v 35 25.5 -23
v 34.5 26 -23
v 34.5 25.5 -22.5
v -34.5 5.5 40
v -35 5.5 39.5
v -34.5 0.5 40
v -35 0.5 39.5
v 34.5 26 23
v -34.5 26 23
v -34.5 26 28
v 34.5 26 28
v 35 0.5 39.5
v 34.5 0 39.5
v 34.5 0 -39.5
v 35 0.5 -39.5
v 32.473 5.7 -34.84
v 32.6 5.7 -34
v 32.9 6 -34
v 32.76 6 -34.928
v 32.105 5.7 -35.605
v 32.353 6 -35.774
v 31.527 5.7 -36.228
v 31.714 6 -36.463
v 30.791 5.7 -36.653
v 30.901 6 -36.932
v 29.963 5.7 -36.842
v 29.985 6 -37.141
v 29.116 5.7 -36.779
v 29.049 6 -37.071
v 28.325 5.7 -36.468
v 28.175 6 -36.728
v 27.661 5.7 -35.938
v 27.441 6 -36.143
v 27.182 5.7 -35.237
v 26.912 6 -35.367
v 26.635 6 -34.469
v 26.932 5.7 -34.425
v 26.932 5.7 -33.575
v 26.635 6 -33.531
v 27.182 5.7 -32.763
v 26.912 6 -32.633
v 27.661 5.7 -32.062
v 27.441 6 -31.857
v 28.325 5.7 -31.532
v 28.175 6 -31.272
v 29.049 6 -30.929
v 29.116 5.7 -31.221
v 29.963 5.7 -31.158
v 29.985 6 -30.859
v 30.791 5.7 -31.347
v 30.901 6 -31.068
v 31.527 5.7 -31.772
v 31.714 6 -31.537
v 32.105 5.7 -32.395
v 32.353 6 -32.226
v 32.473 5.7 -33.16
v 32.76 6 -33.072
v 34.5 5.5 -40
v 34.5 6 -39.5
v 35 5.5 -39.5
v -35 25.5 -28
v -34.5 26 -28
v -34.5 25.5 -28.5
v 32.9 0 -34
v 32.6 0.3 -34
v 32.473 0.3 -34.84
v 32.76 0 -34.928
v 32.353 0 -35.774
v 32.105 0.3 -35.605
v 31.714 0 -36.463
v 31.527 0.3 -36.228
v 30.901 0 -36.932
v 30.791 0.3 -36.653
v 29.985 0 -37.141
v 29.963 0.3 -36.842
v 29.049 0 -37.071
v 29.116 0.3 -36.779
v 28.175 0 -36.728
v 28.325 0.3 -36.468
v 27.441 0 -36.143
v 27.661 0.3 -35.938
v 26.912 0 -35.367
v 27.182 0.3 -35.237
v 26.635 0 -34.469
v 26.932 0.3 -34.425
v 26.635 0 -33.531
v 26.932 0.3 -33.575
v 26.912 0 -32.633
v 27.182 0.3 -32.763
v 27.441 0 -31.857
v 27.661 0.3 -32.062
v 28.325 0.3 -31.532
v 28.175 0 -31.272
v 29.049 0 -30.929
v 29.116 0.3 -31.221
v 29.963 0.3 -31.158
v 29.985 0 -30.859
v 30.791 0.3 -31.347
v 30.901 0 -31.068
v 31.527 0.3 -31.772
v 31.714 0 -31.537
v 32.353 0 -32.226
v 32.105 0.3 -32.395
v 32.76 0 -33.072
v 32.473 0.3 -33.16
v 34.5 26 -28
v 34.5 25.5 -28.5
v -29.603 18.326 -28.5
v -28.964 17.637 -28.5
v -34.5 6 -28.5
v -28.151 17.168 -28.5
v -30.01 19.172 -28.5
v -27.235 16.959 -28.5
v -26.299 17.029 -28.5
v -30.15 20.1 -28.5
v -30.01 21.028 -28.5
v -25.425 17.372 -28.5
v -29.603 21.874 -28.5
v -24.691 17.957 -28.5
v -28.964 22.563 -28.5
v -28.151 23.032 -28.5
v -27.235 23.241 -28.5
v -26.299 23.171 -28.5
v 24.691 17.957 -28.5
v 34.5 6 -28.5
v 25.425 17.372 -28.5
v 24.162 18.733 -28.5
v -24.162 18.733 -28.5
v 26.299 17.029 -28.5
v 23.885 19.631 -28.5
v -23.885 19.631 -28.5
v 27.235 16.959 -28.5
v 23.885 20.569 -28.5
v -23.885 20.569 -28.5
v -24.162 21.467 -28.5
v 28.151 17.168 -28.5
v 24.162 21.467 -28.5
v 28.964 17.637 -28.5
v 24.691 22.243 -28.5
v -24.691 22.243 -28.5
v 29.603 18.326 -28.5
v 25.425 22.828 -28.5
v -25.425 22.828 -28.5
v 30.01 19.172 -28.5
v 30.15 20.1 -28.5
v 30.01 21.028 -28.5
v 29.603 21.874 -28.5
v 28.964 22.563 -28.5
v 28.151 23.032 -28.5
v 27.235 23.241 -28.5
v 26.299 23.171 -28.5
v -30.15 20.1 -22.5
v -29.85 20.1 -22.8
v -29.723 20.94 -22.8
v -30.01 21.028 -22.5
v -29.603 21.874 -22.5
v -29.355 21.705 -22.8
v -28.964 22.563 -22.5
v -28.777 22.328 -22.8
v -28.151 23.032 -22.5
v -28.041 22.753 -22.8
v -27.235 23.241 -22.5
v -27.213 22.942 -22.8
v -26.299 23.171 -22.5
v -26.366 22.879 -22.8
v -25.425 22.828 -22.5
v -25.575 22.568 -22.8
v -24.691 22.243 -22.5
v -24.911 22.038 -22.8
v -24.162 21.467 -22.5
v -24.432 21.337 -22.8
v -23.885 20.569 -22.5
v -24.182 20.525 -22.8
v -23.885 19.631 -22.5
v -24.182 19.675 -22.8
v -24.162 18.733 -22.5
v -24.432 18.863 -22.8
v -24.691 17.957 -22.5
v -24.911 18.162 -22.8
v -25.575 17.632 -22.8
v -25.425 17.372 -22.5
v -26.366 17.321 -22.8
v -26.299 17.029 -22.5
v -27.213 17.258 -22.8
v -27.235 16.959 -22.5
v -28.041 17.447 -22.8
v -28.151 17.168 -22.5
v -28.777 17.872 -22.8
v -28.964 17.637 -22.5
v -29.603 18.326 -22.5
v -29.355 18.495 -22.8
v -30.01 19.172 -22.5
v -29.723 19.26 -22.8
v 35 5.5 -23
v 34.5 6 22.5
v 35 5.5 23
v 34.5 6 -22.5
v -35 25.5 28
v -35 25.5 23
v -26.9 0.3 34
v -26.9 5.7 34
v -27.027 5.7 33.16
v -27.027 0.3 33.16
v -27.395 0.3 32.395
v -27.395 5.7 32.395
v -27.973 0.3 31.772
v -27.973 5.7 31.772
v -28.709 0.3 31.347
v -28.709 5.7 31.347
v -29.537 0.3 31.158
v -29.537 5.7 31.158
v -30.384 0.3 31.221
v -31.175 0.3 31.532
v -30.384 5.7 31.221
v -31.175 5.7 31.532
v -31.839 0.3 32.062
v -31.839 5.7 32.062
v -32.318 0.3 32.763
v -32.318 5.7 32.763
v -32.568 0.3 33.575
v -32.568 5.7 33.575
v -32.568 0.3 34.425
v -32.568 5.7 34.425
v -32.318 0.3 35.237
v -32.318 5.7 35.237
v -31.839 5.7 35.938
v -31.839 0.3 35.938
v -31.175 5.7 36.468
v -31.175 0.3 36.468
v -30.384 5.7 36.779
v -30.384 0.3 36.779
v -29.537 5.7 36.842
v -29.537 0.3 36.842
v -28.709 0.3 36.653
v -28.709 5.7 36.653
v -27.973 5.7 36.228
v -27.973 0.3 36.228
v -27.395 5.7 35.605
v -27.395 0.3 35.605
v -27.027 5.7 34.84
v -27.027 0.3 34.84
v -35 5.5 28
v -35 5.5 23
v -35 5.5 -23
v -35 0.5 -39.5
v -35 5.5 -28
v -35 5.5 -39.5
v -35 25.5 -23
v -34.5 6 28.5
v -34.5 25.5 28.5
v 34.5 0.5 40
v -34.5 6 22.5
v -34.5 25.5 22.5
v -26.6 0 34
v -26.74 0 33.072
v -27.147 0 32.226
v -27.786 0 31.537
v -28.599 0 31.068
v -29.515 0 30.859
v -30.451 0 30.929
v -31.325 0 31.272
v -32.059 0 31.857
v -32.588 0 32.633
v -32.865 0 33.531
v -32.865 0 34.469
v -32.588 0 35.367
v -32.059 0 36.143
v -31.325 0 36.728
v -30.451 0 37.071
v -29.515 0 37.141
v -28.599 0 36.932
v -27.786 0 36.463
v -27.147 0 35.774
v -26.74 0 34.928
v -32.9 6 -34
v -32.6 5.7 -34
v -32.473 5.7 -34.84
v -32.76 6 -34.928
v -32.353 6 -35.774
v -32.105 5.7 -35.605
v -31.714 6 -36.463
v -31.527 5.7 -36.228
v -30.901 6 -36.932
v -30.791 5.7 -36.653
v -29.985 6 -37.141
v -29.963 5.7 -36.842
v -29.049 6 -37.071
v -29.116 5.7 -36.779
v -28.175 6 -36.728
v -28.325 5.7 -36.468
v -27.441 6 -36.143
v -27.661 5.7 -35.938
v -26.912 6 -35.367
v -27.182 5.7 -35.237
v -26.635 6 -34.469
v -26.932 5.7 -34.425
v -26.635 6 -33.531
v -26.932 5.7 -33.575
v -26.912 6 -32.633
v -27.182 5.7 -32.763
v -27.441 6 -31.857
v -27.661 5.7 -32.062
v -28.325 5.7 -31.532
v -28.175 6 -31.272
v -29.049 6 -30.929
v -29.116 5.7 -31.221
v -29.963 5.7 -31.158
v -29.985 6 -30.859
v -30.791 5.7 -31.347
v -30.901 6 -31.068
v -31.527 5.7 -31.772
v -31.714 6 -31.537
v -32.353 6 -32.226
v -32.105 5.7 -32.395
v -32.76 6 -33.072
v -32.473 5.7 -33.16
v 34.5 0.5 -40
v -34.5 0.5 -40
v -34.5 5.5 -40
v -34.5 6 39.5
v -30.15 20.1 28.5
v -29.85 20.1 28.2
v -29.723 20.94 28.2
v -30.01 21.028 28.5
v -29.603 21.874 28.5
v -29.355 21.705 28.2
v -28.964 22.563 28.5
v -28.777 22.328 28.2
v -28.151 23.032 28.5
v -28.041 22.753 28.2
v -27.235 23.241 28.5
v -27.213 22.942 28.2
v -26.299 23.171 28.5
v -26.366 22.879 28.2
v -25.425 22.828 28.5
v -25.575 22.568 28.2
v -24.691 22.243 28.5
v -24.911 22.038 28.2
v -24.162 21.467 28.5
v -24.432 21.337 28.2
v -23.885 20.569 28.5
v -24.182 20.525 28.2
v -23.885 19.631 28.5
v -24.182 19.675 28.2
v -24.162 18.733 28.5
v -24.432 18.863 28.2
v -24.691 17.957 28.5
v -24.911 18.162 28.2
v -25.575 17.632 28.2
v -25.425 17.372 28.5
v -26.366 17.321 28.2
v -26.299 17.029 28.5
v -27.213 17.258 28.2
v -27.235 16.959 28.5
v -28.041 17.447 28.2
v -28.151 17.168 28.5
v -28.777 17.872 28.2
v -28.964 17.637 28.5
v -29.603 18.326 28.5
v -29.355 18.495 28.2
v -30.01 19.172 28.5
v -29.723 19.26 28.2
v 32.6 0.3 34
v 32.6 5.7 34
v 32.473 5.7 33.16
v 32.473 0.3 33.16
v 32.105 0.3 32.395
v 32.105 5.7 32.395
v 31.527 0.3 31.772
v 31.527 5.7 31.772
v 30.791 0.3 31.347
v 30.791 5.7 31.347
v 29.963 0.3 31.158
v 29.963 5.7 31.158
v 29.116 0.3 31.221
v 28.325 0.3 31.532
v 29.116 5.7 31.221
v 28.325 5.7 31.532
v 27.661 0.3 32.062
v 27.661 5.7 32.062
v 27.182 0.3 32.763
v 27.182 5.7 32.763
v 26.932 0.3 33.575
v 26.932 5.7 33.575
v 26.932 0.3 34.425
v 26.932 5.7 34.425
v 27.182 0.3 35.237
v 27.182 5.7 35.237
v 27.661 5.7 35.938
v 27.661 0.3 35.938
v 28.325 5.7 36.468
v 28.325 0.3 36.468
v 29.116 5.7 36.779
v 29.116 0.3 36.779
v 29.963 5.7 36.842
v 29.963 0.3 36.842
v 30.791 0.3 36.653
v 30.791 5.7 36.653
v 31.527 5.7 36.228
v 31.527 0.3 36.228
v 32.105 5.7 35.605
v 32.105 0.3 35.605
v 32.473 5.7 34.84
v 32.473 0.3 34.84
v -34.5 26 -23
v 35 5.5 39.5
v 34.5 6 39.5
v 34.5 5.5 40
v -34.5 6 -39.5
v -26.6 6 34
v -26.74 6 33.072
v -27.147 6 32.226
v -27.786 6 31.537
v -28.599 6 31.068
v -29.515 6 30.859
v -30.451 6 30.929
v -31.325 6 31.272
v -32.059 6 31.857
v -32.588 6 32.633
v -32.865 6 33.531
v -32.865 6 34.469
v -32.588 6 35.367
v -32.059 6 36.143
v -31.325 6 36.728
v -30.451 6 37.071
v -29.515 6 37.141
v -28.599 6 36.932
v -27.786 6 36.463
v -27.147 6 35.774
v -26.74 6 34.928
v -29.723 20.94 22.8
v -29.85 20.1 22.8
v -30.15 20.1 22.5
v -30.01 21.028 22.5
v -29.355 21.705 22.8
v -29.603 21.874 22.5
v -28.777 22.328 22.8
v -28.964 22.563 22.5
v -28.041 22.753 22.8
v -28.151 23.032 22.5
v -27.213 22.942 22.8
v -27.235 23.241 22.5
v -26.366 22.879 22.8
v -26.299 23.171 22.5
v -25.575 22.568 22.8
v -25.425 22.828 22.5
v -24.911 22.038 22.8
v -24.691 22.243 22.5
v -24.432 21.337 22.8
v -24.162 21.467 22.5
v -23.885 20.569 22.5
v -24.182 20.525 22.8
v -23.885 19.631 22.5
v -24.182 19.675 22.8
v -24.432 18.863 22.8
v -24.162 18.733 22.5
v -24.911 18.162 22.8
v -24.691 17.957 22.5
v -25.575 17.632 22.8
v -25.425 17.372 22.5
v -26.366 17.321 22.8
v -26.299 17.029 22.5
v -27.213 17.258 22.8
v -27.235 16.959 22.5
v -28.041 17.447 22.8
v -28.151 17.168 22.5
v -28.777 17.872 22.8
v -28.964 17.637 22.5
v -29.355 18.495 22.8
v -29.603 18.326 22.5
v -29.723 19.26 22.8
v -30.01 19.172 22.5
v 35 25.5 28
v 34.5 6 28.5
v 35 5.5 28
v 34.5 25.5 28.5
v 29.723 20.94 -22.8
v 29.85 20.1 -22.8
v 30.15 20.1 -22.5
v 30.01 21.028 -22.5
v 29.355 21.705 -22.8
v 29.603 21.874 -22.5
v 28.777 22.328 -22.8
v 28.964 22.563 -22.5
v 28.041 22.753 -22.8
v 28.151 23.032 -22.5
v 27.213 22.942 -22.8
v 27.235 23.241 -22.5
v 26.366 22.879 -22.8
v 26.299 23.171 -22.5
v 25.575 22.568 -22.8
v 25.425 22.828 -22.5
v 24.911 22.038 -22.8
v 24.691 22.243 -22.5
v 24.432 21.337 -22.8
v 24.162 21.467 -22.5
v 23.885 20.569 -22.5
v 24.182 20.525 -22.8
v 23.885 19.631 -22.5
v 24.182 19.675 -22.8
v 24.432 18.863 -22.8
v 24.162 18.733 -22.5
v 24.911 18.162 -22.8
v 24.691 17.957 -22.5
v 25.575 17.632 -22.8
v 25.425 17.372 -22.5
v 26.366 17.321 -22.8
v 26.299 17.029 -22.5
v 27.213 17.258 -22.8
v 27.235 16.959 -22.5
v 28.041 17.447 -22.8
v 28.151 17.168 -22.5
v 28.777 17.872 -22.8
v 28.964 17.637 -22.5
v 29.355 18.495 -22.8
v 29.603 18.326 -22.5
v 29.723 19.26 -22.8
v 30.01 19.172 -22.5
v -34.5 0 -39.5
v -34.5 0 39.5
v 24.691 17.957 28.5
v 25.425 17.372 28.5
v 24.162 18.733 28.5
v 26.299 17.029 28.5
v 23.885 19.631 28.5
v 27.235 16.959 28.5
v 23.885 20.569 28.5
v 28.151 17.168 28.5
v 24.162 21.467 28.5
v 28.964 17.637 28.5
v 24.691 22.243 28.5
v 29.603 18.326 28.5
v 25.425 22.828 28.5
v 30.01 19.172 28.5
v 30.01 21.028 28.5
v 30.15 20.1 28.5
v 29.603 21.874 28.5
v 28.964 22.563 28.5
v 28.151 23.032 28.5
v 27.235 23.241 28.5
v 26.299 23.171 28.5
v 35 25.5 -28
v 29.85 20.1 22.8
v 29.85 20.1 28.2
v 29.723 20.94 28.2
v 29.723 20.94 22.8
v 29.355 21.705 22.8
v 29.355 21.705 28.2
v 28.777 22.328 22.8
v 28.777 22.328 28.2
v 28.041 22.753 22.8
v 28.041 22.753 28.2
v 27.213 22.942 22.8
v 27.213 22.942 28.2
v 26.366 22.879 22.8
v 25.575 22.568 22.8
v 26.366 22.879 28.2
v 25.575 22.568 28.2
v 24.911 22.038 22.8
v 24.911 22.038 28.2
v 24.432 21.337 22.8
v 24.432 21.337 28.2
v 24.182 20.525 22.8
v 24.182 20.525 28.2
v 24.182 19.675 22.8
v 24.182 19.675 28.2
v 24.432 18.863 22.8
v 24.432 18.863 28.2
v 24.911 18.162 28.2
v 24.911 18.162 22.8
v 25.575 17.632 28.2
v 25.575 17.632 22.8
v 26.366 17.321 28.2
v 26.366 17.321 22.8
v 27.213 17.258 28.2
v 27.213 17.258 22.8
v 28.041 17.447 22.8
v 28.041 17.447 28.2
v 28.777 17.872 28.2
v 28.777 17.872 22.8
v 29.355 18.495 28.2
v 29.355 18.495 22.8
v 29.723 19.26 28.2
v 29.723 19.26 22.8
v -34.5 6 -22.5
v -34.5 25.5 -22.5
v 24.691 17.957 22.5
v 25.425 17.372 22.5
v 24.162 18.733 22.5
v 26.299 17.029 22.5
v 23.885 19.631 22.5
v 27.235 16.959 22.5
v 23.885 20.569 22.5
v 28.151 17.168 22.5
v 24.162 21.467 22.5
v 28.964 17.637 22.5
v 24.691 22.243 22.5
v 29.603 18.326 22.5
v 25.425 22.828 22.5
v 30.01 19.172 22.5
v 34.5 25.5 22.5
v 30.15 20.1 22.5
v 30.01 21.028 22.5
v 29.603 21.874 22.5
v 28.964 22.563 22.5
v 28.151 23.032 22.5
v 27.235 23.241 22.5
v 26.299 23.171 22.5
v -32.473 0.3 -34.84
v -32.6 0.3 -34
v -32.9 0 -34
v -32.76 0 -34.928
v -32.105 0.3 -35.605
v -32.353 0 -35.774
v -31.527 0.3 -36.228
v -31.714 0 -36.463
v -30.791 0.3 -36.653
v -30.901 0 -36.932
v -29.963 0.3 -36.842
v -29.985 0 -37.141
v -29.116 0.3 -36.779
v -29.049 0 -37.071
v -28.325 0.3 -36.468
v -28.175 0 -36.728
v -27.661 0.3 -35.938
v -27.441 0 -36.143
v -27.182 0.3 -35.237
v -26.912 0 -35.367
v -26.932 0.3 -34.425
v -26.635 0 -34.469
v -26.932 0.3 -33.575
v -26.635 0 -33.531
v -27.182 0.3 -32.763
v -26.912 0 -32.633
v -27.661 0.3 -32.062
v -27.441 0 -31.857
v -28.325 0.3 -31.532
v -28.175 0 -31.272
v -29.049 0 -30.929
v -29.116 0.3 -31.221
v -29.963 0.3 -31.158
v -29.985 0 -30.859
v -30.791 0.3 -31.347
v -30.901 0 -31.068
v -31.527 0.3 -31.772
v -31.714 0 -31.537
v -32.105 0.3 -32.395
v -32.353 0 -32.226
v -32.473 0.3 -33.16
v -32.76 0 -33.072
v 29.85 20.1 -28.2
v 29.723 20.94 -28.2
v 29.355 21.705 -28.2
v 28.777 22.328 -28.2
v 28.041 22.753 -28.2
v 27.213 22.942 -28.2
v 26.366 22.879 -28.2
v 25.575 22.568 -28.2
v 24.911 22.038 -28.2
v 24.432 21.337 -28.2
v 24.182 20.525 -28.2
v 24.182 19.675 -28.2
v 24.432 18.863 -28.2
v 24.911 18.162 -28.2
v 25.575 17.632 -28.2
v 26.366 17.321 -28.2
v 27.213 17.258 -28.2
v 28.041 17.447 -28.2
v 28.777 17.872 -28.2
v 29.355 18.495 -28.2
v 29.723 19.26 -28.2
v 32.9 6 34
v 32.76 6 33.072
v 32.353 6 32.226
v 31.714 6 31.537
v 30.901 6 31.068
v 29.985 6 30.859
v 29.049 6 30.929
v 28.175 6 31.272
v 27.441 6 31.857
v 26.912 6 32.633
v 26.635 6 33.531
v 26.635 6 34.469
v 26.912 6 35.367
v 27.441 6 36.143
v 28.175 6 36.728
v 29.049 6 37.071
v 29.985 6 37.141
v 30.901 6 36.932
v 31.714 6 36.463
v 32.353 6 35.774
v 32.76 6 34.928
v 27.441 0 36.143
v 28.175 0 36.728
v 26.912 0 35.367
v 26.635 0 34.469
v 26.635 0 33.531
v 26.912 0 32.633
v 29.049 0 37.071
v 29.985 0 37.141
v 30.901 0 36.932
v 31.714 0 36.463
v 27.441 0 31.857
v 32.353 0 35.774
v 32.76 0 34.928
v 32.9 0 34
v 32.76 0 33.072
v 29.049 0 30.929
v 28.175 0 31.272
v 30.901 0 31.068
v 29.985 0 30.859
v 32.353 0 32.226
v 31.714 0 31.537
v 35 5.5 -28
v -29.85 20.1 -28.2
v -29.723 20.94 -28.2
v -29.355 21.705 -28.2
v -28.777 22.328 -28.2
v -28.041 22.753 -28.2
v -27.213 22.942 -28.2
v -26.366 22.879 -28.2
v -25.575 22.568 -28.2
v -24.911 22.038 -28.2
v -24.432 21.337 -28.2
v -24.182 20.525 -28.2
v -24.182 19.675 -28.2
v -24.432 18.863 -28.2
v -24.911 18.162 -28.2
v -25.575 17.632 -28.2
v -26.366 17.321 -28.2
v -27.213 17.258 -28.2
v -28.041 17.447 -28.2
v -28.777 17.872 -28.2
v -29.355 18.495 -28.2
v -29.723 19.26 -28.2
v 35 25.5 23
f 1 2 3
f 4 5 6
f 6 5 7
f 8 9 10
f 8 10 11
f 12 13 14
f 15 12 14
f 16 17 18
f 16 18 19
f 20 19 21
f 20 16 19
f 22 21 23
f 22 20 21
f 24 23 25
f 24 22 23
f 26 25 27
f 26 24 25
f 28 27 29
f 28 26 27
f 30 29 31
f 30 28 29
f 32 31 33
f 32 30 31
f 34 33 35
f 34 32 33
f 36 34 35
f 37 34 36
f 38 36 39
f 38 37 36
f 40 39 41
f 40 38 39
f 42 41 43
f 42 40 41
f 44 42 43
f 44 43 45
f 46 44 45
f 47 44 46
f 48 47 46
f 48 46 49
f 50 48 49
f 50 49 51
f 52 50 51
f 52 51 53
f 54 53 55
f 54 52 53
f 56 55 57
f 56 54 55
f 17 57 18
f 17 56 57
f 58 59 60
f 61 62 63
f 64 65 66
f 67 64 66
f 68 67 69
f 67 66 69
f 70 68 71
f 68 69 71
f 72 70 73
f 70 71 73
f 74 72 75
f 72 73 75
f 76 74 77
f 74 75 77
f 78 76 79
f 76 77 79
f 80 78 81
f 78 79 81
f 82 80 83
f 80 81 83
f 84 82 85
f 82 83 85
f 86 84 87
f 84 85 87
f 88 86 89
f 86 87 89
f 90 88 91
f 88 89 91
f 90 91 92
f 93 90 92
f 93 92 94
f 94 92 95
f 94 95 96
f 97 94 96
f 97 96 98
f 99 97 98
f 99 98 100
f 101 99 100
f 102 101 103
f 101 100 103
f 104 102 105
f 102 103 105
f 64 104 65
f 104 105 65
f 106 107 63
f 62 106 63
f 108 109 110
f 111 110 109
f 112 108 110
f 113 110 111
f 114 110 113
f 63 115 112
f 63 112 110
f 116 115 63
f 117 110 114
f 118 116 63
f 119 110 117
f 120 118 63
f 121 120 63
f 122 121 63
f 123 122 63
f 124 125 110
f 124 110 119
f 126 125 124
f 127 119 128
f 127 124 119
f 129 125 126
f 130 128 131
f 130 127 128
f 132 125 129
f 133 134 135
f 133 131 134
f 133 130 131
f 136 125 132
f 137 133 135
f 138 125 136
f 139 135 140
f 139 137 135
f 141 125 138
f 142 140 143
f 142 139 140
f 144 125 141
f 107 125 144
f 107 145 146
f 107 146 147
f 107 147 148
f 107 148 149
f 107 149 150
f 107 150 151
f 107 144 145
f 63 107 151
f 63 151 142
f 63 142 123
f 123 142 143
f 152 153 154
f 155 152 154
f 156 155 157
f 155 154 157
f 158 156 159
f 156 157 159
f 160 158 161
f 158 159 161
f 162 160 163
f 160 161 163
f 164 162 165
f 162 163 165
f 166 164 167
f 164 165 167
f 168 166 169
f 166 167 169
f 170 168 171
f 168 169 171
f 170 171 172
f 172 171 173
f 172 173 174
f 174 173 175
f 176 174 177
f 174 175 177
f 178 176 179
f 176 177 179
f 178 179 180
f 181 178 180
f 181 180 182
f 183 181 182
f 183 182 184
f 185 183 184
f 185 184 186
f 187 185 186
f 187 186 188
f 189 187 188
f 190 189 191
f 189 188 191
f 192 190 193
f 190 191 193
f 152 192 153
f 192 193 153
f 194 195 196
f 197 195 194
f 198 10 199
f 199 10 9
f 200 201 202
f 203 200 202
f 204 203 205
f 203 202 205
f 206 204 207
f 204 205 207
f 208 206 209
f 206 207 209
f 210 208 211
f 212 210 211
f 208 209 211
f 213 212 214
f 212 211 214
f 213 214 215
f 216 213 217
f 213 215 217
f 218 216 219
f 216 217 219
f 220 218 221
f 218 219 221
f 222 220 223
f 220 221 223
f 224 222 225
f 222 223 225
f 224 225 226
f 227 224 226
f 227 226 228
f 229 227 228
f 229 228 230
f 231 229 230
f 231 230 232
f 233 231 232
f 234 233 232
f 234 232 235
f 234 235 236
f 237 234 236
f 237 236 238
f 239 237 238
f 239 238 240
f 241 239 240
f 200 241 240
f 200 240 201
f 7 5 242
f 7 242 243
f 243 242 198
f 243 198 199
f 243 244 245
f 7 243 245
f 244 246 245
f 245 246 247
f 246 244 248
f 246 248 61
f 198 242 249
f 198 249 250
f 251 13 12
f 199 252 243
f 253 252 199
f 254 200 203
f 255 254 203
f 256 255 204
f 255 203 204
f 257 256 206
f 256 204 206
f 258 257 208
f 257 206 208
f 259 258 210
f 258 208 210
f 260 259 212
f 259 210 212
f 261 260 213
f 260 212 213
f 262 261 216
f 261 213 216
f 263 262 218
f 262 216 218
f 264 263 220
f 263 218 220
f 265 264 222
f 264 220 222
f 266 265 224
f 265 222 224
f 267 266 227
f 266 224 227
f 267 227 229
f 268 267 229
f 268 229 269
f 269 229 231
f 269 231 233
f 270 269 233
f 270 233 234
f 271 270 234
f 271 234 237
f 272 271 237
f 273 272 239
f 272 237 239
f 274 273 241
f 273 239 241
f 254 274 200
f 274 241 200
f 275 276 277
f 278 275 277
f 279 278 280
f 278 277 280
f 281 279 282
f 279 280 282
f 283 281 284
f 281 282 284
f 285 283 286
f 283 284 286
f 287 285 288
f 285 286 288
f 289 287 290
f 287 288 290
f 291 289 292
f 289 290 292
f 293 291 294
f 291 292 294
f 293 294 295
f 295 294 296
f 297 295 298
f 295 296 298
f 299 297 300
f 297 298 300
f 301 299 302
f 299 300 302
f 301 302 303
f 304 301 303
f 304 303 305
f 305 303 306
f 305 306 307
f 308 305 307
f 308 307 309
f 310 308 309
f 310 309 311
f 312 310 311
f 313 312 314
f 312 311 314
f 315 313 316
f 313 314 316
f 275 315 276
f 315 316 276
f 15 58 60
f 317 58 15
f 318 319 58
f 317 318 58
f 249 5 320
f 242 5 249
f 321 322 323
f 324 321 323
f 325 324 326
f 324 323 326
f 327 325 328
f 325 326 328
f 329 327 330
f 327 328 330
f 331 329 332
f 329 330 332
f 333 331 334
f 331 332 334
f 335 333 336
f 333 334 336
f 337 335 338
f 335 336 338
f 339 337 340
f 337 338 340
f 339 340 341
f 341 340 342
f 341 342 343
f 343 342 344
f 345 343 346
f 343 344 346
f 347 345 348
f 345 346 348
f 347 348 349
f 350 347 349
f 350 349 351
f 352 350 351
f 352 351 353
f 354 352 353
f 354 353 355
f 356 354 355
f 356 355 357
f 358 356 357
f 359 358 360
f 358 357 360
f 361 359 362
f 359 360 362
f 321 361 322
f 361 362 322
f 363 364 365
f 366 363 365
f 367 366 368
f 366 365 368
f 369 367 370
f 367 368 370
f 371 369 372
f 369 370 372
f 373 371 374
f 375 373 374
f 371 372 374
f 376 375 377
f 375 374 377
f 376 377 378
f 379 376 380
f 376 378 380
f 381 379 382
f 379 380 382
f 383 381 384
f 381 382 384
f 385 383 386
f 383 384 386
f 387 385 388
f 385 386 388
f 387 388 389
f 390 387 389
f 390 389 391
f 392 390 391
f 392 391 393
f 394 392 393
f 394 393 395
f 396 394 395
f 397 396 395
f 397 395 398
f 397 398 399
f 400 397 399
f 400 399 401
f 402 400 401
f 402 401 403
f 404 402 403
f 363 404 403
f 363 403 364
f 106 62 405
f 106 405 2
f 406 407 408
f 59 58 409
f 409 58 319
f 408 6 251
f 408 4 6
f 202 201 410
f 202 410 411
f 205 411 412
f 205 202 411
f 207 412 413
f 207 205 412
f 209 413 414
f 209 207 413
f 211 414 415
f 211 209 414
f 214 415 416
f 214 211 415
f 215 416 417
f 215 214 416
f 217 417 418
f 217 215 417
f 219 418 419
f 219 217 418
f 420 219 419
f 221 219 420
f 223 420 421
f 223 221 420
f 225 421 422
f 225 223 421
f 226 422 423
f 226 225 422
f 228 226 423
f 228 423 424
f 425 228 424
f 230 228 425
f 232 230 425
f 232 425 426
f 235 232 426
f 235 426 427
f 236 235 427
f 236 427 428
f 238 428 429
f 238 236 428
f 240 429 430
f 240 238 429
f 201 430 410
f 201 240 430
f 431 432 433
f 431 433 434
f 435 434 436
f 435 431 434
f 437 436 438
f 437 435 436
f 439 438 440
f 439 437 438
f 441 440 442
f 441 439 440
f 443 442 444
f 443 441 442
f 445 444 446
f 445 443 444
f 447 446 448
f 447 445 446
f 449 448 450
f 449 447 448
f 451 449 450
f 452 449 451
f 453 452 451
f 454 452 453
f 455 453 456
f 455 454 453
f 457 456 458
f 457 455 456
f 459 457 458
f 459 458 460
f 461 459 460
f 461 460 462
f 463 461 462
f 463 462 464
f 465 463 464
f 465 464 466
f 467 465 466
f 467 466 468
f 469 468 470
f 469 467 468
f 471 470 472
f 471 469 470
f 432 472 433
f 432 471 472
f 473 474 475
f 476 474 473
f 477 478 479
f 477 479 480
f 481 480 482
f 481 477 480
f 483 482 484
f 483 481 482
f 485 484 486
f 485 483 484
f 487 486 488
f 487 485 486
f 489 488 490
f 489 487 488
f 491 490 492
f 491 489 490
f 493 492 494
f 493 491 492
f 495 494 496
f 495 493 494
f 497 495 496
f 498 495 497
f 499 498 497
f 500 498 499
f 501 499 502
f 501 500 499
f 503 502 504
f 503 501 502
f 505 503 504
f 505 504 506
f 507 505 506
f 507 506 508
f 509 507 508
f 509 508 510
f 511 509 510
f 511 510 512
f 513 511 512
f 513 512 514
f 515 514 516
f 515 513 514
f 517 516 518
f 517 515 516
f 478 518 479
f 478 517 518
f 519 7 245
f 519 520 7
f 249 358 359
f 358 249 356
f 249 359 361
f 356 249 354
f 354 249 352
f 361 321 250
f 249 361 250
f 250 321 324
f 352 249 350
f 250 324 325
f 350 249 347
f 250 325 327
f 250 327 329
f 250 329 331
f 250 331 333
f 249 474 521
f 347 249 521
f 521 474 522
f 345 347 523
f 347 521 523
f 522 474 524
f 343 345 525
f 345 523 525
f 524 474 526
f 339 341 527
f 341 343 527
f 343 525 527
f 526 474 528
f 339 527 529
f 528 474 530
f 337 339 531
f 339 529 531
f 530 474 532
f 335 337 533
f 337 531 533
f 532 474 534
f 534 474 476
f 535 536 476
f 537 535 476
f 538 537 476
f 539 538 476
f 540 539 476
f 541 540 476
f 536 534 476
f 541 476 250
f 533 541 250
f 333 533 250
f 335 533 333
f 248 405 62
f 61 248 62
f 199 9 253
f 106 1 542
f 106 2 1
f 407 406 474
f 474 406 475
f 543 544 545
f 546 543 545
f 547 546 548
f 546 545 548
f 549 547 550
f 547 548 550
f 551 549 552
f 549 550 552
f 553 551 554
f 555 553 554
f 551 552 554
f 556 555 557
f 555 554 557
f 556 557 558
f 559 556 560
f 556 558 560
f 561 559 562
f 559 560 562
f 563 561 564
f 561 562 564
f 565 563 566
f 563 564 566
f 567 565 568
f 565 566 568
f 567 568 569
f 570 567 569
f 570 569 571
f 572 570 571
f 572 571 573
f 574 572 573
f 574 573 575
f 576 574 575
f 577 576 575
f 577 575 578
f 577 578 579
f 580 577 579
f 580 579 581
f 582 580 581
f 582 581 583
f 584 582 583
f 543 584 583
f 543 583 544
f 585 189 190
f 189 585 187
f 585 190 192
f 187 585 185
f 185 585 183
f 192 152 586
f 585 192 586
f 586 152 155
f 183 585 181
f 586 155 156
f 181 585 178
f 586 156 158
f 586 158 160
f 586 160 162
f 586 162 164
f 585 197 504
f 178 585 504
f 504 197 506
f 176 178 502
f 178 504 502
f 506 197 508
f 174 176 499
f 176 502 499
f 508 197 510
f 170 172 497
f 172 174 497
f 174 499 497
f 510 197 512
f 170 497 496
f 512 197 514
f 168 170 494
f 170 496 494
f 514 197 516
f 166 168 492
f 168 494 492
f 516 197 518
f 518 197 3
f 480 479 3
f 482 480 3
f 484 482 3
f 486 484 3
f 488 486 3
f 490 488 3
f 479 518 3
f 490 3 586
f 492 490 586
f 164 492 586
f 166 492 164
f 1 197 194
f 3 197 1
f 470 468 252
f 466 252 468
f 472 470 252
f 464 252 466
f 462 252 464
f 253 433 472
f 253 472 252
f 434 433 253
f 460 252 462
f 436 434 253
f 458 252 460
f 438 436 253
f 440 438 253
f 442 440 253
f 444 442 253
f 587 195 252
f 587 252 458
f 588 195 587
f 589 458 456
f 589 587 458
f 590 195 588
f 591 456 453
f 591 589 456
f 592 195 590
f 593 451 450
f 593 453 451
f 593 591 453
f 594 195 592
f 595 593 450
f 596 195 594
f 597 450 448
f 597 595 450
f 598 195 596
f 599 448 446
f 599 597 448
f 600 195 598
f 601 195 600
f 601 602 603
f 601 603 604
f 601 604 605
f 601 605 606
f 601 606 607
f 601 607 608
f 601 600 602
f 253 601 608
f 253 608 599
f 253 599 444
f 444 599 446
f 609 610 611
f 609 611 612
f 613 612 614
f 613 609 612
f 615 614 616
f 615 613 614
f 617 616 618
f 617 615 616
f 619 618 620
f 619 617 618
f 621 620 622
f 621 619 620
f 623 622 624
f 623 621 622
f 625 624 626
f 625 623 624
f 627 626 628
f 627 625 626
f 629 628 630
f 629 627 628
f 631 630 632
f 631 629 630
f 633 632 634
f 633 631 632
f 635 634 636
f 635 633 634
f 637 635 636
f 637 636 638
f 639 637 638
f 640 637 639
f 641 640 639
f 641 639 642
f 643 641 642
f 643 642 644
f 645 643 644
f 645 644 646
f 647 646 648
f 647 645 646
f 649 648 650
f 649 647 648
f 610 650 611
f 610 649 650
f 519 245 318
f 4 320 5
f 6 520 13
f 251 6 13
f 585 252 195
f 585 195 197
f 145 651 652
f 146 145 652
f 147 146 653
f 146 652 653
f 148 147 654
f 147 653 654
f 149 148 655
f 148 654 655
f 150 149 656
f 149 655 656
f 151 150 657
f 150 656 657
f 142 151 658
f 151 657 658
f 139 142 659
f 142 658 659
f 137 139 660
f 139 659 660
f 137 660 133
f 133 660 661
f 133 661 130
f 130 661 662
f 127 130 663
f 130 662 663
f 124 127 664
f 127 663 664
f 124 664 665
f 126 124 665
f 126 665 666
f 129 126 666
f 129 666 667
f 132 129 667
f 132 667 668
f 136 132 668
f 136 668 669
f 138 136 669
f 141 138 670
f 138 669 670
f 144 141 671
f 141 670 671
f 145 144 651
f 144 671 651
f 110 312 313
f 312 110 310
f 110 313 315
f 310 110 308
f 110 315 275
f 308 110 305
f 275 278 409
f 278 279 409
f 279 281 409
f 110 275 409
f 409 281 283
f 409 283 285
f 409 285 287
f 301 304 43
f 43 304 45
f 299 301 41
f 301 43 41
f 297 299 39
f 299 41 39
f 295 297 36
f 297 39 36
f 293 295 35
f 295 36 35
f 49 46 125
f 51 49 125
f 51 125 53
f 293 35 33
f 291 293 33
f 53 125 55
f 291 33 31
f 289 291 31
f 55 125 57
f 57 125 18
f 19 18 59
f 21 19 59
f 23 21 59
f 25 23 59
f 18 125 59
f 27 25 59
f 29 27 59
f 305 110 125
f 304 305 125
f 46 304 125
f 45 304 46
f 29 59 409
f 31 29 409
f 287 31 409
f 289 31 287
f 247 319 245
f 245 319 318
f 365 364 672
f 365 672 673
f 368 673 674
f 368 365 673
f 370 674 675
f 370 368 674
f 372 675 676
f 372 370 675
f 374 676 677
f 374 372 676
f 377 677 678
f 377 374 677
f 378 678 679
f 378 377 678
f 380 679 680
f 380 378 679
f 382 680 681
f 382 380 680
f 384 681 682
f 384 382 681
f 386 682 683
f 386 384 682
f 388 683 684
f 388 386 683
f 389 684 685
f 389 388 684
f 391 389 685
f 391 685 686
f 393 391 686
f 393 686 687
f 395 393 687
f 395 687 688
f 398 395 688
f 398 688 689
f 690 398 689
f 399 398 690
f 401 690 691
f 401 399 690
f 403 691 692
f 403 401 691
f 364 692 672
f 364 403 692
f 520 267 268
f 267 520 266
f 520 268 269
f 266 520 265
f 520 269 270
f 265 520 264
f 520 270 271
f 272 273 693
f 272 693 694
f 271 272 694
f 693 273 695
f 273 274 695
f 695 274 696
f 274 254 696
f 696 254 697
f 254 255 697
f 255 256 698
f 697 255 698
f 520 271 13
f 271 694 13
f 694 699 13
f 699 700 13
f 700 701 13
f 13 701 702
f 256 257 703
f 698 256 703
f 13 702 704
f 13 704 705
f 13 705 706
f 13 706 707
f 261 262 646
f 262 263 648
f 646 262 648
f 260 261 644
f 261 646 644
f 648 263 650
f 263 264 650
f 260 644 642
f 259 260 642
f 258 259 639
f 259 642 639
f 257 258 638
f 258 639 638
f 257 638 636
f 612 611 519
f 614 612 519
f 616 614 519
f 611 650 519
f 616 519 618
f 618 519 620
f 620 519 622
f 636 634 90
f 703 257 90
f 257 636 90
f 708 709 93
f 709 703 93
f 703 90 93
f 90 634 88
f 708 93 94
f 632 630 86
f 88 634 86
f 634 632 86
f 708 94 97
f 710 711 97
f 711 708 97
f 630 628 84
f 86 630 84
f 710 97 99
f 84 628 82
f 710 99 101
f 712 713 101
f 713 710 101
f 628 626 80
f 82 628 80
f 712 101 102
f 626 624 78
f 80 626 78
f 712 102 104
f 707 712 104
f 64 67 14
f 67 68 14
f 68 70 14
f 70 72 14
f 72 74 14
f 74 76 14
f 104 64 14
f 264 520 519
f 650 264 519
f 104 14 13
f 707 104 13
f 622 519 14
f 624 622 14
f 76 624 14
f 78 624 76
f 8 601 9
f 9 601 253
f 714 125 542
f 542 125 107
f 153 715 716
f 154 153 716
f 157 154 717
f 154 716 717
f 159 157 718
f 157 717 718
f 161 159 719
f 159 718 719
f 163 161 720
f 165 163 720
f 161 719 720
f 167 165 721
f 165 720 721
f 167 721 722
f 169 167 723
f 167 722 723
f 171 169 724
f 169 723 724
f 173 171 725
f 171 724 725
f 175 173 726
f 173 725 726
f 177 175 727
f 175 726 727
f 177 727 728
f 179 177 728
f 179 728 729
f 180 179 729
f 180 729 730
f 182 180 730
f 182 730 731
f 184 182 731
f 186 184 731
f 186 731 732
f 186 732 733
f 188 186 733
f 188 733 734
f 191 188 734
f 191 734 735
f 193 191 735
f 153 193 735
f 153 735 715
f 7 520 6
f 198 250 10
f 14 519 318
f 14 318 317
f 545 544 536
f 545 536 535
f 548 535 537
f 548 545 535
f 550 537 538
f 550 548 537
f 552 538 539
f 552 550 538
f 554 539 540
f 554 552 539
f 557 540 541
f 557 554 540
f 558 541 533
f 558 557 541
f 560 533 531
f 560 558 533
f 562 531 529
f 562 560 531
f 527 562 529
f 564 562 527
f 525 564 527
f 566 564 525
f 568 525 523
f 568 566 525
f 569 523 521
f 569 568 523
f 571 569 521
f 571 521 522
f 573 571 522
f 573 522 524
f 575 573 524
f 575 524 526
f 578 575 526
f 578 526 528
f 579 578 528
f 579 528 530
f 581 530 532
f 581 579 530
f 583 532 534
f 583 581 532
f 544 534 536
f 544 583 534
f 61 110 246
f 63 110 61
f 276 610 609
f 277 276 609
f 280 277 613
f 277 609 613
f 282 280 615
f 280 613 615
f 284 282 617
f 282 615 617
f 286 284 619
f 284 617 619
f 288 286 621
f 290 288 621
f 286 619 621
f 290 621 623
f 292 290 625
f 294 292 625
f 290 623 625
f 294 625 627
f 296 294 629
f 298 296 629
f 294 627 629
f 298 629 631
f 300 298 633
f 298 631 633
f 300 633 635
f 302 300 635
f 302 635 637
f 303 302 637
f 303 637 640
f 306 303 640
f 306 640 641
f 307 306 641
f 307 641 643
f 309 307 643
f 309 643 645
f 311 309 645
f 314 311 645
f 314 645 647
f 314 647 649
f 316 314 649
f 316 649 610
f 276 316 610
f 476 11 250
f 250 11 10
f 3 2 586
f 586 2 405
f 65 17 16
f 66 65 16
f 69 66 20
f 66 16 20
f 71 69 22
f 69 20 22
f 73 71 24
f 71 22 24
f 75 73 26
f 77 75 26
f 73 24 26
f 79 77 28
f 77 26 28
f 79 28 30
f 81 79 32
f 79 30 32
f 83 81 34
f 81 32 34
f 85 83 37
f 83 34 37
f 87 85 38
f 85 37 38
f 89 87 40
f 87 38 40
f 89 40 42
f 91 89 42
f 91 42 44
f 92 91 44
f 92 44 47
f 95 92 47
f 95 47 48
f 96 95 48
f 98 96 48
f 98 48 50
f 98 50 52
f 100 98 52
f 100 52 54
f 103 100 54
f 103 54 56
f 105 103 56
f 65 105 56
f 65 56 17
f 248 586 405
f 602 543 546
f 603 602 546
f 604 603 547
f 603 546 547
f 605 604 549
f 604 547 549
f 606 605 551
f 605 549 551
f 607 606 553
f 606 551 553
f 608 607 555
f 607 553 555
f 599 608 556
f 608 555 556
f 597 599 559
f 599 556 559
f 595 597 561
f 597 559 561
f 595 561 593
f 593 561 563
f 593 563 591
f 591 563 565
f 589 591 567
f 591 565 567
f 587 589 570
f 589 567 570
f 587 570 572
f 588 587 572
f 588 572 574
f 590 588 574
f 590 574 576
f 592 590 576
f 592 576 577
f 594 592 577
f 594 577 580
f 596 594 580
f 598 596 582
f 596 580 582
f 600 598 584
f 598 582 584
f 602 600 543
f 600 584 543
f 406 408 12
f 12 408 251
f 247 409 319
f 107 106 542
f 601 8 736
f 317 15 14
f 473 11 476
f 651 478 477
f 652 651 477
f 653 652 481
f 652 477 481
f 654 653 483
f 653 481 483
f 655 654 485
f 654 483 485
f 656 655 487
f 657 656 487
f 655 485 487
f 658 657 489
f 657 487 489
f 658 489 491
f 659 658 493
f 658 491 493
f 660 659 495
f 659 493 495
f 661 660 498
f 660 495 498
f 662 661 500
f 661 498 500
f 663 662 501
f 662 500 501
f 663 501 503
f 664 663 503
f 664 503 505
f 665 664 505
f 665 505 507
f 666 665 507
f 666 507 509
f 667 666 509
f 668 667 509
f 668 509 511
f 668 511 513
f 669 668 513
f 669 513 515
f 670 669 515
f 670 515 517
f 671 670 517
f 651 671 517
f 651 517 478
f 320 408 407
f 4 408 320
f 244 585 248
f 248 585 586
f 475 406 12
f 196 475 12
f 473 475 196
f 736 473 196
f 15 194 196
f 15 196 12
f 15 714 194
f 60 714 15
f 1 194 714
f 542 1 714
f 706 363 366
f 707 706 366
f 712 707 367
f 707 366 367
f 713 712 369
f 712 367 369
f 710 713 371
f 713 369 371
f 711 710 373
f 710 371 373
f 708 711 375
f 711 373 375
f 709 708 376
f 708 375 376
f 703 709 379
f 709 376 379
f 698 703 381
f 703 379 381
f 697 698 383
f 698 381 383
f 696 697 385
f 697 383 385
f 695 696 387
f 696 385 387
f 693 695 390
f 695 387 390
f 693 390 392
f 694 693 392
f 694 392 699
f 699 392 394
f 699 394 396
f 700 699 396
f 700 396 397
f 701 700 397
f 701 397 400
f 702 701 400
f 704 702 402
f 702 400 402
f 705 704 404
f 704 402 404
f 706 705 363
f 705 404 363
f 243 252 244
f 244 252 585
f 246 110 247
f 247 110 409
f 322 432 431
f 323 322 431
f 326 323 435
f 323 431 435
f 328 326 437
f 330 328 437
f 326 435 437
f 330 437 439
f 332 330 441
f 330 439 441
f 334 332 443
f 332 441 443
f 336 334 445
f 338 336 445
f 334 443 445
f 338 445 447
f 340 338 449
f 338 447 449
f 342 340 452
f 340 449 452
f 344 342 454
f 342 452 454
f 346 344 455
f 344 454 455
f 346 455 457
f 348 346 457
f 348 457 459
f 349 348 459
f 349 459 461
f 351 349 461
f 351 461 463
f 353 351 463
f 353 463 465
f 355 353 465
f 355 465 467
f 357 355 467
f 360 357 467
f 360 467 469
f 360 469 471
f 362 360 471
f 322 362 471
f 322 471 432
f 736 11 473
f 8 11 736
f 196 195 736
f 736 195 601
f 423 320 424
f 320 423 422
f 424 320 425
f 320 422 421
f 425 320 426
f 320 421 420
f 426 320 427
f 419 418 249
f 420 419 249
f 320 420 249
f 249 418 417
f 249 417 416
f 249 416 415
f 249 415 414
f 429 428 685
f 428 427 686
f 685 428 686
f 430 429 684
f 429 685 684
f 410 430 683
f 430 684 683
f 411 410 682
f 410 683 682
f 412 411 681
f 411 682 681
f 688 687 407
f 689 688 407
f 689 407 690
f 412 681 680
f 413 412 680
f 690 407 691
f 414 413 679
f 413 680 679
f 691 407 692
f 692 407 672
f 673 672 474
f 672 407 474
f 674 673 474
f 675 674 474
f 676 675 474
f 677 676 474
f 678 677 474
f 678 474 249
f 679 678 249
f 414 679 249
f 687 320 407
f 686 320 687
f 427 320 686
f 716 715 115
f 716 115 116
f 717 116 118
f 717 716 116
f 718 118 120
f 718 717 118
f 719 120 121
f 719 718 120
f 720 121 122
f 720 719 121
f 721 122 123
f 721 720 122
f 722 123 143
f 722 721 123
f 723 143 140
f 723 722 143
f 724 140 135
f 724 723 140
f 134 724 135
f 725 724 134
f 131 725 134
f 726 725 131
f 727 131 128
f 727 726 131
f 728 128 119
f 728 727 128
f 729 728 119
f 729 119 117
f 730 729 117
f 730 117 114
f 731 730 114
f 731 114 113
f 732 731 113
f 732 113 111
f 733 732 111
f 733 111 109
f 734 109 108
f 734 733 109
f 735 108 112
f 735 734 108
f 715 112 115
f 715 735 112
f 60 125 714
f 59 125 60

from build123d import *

# Parameters (mm, degrees)
SKETCH_1_W                     = 70
SKETCH_1_H                     = 80
EXTRUDE_1_DEPTH                = 26
SKETCH_2_W                     = 11.5
SKETCH_2_H                     = 20
CUT_EXTRUDE_1_DEPTH            = 71
SKETCH_3_W                     = 45
SKETCH_3_H                     = 20
CUT_EXTRUDE_2_DEPTH            = 71
SKETCH_4_W                     = 11.5
SKETCH_4_H                     = 20
CUT_EXTRUDE_3_DEPTH            = 71
F_5_7_5_7_DIAMETER_HOLE1_D     = 5.7
F_5_7_5_7_DIAMETER_HOLE1_DEPTH = 6
F_5_7_5_7_DIAMETER_HOLE2_D     = 5.7
F_5_7_5_7_DIAMETER_HOLE2_DEPTH = 26
F_5_7_5_7_DIAMETER_HOLE3_D     = 5.7
F_5_7_5_7_DIAMETER_HOLE3_DEPTH = 17.5
F_5_7_5_7_DIAMETER_HOLE4_D     = 5.7
F_5_7_5_7_DIAMETER_HOLE4_DEPTH = 6
F_5_7_5_7_DIAMETER_HOLE5_D     = 5.7
F_5_7_5_7_DIAMETER_HOLE5_DEPTH = 68.5
F_5_7_5_7_DIAMETER_HOLE6_D     = 5.7
F_5_7_5_7_DIAMETER_HOLE6_DEPTH = 17.5
CHAMFER_1_SIZE                 = 0.3
CHAMFER_2_SIZE                 = 0.5


with BuildPart() as part:
    # 스케치1 → 보스-돌출1 (new body)
    with BuildSketch(Plane(origin=(0, 26, 0), x_dir=(1, 0, 0), z_dir=(0, 1, 0))):
        Rectangle(SKETCH_1_W, SKETCH_1_H)
    extrude(amount=-EXTRUDE_1_DEPTH)

    # 스케치2 → 컷-돌출1 (cut, through all)
    with BuildSketch(Plane(origin=(35, 0, 0), x_dir=(0, 0, -1), z_dir=(1, 0, 0))):
        with Locations((-34.25, 16)):
            Rectangle(SKETCH_2_W, SKETCH_2_H)
    extrude(amount=-CUT_EXTRUDE_1_DEPTH, mode=Mode.SUBTRACT)

    # 스케치3 → 컷-돌출2 (cut, through all)
    with BuildSketch(Plane(origin=(35, 0, 0), x_dir=(0, 0, -1), z_dir=(1, 0, 0))):
        with Locations((0, 16)):
            Rectangle(SKETCH_3_W, SKETCH_3_H)
    extrude(amount=-CUT_EXTRUDE_2_DEPTH, mode=Mode.SUBTRACT)

    # 스케치4 → 컷-돌출3 (cut, through all)
    with BuildSketch(Plane(origin=(35, 0, 0), x_dir=(0, 0, -1), z_dir=(1, 0, 0))):
        with Locations((34.25, 16)):
            Rectangle(SKETCH_4_W, SKETCH_4_H)
    extrude(amount=-CUT_EXTRUDE_3_DEPTH, mode=Mode.SUBTRACT)

    # Ø5.7 (5.7) Diameter Hole1
    with Locations(Plane(origin=(0, 6, 0), x_dir=(1, 0, 0), z_dir=(0, 1, 0))):
        with Locations((-29.75, 34)):
            Hole(F_5_7_5_7_DIAMETER_HOLE1_D / 2, depth=F_5_7_5_7_DIAMETER_HOLE1_DEPTH)

    # Ø5.7 (5.7) Diameter Hole2
    with Locations(Plane(origin=(0, 0, 0), x_dir=(-1, 0, 0), z_dir=(0, -1, 0))):
        with Locations((-29.75, -34), (-29.75, 34), (29.75, -34)):
            Hole(F_5_7_5_7_DIAMETER_HOLE2_D / 2, depth=F_5_7_5_7_DIAMETER_HOLE2_DEPTH)

    # Ø5.7 (5.7) Diameter Hole3
    with Locations(Plane.XY.offset(-22.5)):
        with Locations((-27, 20.1)):
            Hole(F_5_7_5_7_DIAMETER_HOLE3_D / 2, depth=F_5_7_5_7_DIAMETER_HOLE3_DEPTH)

    # Ø5.7 (5.7) Diameter Hole4
    with Locations(Plane(origin=(0, 0, -28.5), x_dir=(-1, 0, 0), z_dir=(0, 0, -1))):
        with Locations((-27, 20.1)):
            Hole(F_5_7_5_7_DIAMETER_HOLE4_D / 2, depth=F_5_7_5_7_DIAMETER_HOLE4_DEPTH)

    # Ø5.7 (5.7) Diameter Hole5
    with Locations(Plane.XY.offset(28.5)):
        with Locations((-27, 20.1)):
            Hole(F_5_7_5_7_DIAMETER_HOLE5_D / 2, depth=F_5_7_5_7_DIAMETER_HOLE5_DEPTH)

    # Ø5.7 (5.7) Diameter Hole6
    with Locations(Plane(origin=(0, 0, 22.5), x_dir=(-1, 0, 0), z_dir=(0, 0, -1))):
        with Locations((-27, 20.1)):
            Hole(F_5_7_5_7_DIAMETER_HOLE6_D / 2, depth=F_5_7_5_7_DIAMETER_HOLE6_DEPTH)

    # 모따기1
    chamfer_1_edges = [part.edges().sort_by_distance(p)[0] for p in [
        (-24.15, 20.1, 22.5),
        (-24.15, 20.1, 28.5),
        (24.15, 20.1, 28.5),
        (24.15, 20.1, 22.5),
        (-26.9, 6, -34),
        (-26.9, 0, -34),
        (-32.6, 6, 34),
        (-32.6, 0, 34),
        (26.9, 6, -34),
        (26.9, 0, -34),
        (26.9, 6, 34),
        (26.9, 0, 34),
        (-24.15, 20.1, -28.5),
        (-24.15, 20.1, -22.5),
        (24.15, 20.1, -28.5),
        (24.15, 20.1, -22.5),
    ]]
    chamfer(chamfer_1_edges, length=CHAMFER_1_SIZE)

    # 모따기2
    chamfer_2_edges = [part.edges().sort_by_distance(p)[0] for p in [
        (-35, 0, 0),
        (35, 26, 25.5),
        (0, 0, 40),
        (-35, 6, 34.25),
        (0, 6, 40),
        (-35, 16, 28.5),
        (0, 26, 28.5),
        (35, 6, 34.25),
        (35, 16, 28.5),
        (35, 26, -25.5),
        (-35, 26, 25.5),
        (0, 26, 22.5),
        (-35, 16, -22.5),
        (0, 26, -22.5),
        (-35, 6, 0),
        (-35, 16, 22.5),
        (35, 16, 22.5),
        (35, 6, 0),
        (35, 16, -22.5),
        (-35, 26, -25.5),
        (35, 0, 0),
        (0, 26, -28.5),
        (-35, 6, -34.25),
        (0, 6, -40),
        (-35, 16, -28.5),
        (35, 16, -28.5),
        (35, 6, -34.25),
        (35, 3, 40),
        (-35, 3, 40),
        (-35, 3, -40),
        (35, 3, -40),
        (0, 0, -40),
    ]]
    chamfer(chamfer_2_edges, length=CHAMFER_2_SIZE)


solid = part.part
